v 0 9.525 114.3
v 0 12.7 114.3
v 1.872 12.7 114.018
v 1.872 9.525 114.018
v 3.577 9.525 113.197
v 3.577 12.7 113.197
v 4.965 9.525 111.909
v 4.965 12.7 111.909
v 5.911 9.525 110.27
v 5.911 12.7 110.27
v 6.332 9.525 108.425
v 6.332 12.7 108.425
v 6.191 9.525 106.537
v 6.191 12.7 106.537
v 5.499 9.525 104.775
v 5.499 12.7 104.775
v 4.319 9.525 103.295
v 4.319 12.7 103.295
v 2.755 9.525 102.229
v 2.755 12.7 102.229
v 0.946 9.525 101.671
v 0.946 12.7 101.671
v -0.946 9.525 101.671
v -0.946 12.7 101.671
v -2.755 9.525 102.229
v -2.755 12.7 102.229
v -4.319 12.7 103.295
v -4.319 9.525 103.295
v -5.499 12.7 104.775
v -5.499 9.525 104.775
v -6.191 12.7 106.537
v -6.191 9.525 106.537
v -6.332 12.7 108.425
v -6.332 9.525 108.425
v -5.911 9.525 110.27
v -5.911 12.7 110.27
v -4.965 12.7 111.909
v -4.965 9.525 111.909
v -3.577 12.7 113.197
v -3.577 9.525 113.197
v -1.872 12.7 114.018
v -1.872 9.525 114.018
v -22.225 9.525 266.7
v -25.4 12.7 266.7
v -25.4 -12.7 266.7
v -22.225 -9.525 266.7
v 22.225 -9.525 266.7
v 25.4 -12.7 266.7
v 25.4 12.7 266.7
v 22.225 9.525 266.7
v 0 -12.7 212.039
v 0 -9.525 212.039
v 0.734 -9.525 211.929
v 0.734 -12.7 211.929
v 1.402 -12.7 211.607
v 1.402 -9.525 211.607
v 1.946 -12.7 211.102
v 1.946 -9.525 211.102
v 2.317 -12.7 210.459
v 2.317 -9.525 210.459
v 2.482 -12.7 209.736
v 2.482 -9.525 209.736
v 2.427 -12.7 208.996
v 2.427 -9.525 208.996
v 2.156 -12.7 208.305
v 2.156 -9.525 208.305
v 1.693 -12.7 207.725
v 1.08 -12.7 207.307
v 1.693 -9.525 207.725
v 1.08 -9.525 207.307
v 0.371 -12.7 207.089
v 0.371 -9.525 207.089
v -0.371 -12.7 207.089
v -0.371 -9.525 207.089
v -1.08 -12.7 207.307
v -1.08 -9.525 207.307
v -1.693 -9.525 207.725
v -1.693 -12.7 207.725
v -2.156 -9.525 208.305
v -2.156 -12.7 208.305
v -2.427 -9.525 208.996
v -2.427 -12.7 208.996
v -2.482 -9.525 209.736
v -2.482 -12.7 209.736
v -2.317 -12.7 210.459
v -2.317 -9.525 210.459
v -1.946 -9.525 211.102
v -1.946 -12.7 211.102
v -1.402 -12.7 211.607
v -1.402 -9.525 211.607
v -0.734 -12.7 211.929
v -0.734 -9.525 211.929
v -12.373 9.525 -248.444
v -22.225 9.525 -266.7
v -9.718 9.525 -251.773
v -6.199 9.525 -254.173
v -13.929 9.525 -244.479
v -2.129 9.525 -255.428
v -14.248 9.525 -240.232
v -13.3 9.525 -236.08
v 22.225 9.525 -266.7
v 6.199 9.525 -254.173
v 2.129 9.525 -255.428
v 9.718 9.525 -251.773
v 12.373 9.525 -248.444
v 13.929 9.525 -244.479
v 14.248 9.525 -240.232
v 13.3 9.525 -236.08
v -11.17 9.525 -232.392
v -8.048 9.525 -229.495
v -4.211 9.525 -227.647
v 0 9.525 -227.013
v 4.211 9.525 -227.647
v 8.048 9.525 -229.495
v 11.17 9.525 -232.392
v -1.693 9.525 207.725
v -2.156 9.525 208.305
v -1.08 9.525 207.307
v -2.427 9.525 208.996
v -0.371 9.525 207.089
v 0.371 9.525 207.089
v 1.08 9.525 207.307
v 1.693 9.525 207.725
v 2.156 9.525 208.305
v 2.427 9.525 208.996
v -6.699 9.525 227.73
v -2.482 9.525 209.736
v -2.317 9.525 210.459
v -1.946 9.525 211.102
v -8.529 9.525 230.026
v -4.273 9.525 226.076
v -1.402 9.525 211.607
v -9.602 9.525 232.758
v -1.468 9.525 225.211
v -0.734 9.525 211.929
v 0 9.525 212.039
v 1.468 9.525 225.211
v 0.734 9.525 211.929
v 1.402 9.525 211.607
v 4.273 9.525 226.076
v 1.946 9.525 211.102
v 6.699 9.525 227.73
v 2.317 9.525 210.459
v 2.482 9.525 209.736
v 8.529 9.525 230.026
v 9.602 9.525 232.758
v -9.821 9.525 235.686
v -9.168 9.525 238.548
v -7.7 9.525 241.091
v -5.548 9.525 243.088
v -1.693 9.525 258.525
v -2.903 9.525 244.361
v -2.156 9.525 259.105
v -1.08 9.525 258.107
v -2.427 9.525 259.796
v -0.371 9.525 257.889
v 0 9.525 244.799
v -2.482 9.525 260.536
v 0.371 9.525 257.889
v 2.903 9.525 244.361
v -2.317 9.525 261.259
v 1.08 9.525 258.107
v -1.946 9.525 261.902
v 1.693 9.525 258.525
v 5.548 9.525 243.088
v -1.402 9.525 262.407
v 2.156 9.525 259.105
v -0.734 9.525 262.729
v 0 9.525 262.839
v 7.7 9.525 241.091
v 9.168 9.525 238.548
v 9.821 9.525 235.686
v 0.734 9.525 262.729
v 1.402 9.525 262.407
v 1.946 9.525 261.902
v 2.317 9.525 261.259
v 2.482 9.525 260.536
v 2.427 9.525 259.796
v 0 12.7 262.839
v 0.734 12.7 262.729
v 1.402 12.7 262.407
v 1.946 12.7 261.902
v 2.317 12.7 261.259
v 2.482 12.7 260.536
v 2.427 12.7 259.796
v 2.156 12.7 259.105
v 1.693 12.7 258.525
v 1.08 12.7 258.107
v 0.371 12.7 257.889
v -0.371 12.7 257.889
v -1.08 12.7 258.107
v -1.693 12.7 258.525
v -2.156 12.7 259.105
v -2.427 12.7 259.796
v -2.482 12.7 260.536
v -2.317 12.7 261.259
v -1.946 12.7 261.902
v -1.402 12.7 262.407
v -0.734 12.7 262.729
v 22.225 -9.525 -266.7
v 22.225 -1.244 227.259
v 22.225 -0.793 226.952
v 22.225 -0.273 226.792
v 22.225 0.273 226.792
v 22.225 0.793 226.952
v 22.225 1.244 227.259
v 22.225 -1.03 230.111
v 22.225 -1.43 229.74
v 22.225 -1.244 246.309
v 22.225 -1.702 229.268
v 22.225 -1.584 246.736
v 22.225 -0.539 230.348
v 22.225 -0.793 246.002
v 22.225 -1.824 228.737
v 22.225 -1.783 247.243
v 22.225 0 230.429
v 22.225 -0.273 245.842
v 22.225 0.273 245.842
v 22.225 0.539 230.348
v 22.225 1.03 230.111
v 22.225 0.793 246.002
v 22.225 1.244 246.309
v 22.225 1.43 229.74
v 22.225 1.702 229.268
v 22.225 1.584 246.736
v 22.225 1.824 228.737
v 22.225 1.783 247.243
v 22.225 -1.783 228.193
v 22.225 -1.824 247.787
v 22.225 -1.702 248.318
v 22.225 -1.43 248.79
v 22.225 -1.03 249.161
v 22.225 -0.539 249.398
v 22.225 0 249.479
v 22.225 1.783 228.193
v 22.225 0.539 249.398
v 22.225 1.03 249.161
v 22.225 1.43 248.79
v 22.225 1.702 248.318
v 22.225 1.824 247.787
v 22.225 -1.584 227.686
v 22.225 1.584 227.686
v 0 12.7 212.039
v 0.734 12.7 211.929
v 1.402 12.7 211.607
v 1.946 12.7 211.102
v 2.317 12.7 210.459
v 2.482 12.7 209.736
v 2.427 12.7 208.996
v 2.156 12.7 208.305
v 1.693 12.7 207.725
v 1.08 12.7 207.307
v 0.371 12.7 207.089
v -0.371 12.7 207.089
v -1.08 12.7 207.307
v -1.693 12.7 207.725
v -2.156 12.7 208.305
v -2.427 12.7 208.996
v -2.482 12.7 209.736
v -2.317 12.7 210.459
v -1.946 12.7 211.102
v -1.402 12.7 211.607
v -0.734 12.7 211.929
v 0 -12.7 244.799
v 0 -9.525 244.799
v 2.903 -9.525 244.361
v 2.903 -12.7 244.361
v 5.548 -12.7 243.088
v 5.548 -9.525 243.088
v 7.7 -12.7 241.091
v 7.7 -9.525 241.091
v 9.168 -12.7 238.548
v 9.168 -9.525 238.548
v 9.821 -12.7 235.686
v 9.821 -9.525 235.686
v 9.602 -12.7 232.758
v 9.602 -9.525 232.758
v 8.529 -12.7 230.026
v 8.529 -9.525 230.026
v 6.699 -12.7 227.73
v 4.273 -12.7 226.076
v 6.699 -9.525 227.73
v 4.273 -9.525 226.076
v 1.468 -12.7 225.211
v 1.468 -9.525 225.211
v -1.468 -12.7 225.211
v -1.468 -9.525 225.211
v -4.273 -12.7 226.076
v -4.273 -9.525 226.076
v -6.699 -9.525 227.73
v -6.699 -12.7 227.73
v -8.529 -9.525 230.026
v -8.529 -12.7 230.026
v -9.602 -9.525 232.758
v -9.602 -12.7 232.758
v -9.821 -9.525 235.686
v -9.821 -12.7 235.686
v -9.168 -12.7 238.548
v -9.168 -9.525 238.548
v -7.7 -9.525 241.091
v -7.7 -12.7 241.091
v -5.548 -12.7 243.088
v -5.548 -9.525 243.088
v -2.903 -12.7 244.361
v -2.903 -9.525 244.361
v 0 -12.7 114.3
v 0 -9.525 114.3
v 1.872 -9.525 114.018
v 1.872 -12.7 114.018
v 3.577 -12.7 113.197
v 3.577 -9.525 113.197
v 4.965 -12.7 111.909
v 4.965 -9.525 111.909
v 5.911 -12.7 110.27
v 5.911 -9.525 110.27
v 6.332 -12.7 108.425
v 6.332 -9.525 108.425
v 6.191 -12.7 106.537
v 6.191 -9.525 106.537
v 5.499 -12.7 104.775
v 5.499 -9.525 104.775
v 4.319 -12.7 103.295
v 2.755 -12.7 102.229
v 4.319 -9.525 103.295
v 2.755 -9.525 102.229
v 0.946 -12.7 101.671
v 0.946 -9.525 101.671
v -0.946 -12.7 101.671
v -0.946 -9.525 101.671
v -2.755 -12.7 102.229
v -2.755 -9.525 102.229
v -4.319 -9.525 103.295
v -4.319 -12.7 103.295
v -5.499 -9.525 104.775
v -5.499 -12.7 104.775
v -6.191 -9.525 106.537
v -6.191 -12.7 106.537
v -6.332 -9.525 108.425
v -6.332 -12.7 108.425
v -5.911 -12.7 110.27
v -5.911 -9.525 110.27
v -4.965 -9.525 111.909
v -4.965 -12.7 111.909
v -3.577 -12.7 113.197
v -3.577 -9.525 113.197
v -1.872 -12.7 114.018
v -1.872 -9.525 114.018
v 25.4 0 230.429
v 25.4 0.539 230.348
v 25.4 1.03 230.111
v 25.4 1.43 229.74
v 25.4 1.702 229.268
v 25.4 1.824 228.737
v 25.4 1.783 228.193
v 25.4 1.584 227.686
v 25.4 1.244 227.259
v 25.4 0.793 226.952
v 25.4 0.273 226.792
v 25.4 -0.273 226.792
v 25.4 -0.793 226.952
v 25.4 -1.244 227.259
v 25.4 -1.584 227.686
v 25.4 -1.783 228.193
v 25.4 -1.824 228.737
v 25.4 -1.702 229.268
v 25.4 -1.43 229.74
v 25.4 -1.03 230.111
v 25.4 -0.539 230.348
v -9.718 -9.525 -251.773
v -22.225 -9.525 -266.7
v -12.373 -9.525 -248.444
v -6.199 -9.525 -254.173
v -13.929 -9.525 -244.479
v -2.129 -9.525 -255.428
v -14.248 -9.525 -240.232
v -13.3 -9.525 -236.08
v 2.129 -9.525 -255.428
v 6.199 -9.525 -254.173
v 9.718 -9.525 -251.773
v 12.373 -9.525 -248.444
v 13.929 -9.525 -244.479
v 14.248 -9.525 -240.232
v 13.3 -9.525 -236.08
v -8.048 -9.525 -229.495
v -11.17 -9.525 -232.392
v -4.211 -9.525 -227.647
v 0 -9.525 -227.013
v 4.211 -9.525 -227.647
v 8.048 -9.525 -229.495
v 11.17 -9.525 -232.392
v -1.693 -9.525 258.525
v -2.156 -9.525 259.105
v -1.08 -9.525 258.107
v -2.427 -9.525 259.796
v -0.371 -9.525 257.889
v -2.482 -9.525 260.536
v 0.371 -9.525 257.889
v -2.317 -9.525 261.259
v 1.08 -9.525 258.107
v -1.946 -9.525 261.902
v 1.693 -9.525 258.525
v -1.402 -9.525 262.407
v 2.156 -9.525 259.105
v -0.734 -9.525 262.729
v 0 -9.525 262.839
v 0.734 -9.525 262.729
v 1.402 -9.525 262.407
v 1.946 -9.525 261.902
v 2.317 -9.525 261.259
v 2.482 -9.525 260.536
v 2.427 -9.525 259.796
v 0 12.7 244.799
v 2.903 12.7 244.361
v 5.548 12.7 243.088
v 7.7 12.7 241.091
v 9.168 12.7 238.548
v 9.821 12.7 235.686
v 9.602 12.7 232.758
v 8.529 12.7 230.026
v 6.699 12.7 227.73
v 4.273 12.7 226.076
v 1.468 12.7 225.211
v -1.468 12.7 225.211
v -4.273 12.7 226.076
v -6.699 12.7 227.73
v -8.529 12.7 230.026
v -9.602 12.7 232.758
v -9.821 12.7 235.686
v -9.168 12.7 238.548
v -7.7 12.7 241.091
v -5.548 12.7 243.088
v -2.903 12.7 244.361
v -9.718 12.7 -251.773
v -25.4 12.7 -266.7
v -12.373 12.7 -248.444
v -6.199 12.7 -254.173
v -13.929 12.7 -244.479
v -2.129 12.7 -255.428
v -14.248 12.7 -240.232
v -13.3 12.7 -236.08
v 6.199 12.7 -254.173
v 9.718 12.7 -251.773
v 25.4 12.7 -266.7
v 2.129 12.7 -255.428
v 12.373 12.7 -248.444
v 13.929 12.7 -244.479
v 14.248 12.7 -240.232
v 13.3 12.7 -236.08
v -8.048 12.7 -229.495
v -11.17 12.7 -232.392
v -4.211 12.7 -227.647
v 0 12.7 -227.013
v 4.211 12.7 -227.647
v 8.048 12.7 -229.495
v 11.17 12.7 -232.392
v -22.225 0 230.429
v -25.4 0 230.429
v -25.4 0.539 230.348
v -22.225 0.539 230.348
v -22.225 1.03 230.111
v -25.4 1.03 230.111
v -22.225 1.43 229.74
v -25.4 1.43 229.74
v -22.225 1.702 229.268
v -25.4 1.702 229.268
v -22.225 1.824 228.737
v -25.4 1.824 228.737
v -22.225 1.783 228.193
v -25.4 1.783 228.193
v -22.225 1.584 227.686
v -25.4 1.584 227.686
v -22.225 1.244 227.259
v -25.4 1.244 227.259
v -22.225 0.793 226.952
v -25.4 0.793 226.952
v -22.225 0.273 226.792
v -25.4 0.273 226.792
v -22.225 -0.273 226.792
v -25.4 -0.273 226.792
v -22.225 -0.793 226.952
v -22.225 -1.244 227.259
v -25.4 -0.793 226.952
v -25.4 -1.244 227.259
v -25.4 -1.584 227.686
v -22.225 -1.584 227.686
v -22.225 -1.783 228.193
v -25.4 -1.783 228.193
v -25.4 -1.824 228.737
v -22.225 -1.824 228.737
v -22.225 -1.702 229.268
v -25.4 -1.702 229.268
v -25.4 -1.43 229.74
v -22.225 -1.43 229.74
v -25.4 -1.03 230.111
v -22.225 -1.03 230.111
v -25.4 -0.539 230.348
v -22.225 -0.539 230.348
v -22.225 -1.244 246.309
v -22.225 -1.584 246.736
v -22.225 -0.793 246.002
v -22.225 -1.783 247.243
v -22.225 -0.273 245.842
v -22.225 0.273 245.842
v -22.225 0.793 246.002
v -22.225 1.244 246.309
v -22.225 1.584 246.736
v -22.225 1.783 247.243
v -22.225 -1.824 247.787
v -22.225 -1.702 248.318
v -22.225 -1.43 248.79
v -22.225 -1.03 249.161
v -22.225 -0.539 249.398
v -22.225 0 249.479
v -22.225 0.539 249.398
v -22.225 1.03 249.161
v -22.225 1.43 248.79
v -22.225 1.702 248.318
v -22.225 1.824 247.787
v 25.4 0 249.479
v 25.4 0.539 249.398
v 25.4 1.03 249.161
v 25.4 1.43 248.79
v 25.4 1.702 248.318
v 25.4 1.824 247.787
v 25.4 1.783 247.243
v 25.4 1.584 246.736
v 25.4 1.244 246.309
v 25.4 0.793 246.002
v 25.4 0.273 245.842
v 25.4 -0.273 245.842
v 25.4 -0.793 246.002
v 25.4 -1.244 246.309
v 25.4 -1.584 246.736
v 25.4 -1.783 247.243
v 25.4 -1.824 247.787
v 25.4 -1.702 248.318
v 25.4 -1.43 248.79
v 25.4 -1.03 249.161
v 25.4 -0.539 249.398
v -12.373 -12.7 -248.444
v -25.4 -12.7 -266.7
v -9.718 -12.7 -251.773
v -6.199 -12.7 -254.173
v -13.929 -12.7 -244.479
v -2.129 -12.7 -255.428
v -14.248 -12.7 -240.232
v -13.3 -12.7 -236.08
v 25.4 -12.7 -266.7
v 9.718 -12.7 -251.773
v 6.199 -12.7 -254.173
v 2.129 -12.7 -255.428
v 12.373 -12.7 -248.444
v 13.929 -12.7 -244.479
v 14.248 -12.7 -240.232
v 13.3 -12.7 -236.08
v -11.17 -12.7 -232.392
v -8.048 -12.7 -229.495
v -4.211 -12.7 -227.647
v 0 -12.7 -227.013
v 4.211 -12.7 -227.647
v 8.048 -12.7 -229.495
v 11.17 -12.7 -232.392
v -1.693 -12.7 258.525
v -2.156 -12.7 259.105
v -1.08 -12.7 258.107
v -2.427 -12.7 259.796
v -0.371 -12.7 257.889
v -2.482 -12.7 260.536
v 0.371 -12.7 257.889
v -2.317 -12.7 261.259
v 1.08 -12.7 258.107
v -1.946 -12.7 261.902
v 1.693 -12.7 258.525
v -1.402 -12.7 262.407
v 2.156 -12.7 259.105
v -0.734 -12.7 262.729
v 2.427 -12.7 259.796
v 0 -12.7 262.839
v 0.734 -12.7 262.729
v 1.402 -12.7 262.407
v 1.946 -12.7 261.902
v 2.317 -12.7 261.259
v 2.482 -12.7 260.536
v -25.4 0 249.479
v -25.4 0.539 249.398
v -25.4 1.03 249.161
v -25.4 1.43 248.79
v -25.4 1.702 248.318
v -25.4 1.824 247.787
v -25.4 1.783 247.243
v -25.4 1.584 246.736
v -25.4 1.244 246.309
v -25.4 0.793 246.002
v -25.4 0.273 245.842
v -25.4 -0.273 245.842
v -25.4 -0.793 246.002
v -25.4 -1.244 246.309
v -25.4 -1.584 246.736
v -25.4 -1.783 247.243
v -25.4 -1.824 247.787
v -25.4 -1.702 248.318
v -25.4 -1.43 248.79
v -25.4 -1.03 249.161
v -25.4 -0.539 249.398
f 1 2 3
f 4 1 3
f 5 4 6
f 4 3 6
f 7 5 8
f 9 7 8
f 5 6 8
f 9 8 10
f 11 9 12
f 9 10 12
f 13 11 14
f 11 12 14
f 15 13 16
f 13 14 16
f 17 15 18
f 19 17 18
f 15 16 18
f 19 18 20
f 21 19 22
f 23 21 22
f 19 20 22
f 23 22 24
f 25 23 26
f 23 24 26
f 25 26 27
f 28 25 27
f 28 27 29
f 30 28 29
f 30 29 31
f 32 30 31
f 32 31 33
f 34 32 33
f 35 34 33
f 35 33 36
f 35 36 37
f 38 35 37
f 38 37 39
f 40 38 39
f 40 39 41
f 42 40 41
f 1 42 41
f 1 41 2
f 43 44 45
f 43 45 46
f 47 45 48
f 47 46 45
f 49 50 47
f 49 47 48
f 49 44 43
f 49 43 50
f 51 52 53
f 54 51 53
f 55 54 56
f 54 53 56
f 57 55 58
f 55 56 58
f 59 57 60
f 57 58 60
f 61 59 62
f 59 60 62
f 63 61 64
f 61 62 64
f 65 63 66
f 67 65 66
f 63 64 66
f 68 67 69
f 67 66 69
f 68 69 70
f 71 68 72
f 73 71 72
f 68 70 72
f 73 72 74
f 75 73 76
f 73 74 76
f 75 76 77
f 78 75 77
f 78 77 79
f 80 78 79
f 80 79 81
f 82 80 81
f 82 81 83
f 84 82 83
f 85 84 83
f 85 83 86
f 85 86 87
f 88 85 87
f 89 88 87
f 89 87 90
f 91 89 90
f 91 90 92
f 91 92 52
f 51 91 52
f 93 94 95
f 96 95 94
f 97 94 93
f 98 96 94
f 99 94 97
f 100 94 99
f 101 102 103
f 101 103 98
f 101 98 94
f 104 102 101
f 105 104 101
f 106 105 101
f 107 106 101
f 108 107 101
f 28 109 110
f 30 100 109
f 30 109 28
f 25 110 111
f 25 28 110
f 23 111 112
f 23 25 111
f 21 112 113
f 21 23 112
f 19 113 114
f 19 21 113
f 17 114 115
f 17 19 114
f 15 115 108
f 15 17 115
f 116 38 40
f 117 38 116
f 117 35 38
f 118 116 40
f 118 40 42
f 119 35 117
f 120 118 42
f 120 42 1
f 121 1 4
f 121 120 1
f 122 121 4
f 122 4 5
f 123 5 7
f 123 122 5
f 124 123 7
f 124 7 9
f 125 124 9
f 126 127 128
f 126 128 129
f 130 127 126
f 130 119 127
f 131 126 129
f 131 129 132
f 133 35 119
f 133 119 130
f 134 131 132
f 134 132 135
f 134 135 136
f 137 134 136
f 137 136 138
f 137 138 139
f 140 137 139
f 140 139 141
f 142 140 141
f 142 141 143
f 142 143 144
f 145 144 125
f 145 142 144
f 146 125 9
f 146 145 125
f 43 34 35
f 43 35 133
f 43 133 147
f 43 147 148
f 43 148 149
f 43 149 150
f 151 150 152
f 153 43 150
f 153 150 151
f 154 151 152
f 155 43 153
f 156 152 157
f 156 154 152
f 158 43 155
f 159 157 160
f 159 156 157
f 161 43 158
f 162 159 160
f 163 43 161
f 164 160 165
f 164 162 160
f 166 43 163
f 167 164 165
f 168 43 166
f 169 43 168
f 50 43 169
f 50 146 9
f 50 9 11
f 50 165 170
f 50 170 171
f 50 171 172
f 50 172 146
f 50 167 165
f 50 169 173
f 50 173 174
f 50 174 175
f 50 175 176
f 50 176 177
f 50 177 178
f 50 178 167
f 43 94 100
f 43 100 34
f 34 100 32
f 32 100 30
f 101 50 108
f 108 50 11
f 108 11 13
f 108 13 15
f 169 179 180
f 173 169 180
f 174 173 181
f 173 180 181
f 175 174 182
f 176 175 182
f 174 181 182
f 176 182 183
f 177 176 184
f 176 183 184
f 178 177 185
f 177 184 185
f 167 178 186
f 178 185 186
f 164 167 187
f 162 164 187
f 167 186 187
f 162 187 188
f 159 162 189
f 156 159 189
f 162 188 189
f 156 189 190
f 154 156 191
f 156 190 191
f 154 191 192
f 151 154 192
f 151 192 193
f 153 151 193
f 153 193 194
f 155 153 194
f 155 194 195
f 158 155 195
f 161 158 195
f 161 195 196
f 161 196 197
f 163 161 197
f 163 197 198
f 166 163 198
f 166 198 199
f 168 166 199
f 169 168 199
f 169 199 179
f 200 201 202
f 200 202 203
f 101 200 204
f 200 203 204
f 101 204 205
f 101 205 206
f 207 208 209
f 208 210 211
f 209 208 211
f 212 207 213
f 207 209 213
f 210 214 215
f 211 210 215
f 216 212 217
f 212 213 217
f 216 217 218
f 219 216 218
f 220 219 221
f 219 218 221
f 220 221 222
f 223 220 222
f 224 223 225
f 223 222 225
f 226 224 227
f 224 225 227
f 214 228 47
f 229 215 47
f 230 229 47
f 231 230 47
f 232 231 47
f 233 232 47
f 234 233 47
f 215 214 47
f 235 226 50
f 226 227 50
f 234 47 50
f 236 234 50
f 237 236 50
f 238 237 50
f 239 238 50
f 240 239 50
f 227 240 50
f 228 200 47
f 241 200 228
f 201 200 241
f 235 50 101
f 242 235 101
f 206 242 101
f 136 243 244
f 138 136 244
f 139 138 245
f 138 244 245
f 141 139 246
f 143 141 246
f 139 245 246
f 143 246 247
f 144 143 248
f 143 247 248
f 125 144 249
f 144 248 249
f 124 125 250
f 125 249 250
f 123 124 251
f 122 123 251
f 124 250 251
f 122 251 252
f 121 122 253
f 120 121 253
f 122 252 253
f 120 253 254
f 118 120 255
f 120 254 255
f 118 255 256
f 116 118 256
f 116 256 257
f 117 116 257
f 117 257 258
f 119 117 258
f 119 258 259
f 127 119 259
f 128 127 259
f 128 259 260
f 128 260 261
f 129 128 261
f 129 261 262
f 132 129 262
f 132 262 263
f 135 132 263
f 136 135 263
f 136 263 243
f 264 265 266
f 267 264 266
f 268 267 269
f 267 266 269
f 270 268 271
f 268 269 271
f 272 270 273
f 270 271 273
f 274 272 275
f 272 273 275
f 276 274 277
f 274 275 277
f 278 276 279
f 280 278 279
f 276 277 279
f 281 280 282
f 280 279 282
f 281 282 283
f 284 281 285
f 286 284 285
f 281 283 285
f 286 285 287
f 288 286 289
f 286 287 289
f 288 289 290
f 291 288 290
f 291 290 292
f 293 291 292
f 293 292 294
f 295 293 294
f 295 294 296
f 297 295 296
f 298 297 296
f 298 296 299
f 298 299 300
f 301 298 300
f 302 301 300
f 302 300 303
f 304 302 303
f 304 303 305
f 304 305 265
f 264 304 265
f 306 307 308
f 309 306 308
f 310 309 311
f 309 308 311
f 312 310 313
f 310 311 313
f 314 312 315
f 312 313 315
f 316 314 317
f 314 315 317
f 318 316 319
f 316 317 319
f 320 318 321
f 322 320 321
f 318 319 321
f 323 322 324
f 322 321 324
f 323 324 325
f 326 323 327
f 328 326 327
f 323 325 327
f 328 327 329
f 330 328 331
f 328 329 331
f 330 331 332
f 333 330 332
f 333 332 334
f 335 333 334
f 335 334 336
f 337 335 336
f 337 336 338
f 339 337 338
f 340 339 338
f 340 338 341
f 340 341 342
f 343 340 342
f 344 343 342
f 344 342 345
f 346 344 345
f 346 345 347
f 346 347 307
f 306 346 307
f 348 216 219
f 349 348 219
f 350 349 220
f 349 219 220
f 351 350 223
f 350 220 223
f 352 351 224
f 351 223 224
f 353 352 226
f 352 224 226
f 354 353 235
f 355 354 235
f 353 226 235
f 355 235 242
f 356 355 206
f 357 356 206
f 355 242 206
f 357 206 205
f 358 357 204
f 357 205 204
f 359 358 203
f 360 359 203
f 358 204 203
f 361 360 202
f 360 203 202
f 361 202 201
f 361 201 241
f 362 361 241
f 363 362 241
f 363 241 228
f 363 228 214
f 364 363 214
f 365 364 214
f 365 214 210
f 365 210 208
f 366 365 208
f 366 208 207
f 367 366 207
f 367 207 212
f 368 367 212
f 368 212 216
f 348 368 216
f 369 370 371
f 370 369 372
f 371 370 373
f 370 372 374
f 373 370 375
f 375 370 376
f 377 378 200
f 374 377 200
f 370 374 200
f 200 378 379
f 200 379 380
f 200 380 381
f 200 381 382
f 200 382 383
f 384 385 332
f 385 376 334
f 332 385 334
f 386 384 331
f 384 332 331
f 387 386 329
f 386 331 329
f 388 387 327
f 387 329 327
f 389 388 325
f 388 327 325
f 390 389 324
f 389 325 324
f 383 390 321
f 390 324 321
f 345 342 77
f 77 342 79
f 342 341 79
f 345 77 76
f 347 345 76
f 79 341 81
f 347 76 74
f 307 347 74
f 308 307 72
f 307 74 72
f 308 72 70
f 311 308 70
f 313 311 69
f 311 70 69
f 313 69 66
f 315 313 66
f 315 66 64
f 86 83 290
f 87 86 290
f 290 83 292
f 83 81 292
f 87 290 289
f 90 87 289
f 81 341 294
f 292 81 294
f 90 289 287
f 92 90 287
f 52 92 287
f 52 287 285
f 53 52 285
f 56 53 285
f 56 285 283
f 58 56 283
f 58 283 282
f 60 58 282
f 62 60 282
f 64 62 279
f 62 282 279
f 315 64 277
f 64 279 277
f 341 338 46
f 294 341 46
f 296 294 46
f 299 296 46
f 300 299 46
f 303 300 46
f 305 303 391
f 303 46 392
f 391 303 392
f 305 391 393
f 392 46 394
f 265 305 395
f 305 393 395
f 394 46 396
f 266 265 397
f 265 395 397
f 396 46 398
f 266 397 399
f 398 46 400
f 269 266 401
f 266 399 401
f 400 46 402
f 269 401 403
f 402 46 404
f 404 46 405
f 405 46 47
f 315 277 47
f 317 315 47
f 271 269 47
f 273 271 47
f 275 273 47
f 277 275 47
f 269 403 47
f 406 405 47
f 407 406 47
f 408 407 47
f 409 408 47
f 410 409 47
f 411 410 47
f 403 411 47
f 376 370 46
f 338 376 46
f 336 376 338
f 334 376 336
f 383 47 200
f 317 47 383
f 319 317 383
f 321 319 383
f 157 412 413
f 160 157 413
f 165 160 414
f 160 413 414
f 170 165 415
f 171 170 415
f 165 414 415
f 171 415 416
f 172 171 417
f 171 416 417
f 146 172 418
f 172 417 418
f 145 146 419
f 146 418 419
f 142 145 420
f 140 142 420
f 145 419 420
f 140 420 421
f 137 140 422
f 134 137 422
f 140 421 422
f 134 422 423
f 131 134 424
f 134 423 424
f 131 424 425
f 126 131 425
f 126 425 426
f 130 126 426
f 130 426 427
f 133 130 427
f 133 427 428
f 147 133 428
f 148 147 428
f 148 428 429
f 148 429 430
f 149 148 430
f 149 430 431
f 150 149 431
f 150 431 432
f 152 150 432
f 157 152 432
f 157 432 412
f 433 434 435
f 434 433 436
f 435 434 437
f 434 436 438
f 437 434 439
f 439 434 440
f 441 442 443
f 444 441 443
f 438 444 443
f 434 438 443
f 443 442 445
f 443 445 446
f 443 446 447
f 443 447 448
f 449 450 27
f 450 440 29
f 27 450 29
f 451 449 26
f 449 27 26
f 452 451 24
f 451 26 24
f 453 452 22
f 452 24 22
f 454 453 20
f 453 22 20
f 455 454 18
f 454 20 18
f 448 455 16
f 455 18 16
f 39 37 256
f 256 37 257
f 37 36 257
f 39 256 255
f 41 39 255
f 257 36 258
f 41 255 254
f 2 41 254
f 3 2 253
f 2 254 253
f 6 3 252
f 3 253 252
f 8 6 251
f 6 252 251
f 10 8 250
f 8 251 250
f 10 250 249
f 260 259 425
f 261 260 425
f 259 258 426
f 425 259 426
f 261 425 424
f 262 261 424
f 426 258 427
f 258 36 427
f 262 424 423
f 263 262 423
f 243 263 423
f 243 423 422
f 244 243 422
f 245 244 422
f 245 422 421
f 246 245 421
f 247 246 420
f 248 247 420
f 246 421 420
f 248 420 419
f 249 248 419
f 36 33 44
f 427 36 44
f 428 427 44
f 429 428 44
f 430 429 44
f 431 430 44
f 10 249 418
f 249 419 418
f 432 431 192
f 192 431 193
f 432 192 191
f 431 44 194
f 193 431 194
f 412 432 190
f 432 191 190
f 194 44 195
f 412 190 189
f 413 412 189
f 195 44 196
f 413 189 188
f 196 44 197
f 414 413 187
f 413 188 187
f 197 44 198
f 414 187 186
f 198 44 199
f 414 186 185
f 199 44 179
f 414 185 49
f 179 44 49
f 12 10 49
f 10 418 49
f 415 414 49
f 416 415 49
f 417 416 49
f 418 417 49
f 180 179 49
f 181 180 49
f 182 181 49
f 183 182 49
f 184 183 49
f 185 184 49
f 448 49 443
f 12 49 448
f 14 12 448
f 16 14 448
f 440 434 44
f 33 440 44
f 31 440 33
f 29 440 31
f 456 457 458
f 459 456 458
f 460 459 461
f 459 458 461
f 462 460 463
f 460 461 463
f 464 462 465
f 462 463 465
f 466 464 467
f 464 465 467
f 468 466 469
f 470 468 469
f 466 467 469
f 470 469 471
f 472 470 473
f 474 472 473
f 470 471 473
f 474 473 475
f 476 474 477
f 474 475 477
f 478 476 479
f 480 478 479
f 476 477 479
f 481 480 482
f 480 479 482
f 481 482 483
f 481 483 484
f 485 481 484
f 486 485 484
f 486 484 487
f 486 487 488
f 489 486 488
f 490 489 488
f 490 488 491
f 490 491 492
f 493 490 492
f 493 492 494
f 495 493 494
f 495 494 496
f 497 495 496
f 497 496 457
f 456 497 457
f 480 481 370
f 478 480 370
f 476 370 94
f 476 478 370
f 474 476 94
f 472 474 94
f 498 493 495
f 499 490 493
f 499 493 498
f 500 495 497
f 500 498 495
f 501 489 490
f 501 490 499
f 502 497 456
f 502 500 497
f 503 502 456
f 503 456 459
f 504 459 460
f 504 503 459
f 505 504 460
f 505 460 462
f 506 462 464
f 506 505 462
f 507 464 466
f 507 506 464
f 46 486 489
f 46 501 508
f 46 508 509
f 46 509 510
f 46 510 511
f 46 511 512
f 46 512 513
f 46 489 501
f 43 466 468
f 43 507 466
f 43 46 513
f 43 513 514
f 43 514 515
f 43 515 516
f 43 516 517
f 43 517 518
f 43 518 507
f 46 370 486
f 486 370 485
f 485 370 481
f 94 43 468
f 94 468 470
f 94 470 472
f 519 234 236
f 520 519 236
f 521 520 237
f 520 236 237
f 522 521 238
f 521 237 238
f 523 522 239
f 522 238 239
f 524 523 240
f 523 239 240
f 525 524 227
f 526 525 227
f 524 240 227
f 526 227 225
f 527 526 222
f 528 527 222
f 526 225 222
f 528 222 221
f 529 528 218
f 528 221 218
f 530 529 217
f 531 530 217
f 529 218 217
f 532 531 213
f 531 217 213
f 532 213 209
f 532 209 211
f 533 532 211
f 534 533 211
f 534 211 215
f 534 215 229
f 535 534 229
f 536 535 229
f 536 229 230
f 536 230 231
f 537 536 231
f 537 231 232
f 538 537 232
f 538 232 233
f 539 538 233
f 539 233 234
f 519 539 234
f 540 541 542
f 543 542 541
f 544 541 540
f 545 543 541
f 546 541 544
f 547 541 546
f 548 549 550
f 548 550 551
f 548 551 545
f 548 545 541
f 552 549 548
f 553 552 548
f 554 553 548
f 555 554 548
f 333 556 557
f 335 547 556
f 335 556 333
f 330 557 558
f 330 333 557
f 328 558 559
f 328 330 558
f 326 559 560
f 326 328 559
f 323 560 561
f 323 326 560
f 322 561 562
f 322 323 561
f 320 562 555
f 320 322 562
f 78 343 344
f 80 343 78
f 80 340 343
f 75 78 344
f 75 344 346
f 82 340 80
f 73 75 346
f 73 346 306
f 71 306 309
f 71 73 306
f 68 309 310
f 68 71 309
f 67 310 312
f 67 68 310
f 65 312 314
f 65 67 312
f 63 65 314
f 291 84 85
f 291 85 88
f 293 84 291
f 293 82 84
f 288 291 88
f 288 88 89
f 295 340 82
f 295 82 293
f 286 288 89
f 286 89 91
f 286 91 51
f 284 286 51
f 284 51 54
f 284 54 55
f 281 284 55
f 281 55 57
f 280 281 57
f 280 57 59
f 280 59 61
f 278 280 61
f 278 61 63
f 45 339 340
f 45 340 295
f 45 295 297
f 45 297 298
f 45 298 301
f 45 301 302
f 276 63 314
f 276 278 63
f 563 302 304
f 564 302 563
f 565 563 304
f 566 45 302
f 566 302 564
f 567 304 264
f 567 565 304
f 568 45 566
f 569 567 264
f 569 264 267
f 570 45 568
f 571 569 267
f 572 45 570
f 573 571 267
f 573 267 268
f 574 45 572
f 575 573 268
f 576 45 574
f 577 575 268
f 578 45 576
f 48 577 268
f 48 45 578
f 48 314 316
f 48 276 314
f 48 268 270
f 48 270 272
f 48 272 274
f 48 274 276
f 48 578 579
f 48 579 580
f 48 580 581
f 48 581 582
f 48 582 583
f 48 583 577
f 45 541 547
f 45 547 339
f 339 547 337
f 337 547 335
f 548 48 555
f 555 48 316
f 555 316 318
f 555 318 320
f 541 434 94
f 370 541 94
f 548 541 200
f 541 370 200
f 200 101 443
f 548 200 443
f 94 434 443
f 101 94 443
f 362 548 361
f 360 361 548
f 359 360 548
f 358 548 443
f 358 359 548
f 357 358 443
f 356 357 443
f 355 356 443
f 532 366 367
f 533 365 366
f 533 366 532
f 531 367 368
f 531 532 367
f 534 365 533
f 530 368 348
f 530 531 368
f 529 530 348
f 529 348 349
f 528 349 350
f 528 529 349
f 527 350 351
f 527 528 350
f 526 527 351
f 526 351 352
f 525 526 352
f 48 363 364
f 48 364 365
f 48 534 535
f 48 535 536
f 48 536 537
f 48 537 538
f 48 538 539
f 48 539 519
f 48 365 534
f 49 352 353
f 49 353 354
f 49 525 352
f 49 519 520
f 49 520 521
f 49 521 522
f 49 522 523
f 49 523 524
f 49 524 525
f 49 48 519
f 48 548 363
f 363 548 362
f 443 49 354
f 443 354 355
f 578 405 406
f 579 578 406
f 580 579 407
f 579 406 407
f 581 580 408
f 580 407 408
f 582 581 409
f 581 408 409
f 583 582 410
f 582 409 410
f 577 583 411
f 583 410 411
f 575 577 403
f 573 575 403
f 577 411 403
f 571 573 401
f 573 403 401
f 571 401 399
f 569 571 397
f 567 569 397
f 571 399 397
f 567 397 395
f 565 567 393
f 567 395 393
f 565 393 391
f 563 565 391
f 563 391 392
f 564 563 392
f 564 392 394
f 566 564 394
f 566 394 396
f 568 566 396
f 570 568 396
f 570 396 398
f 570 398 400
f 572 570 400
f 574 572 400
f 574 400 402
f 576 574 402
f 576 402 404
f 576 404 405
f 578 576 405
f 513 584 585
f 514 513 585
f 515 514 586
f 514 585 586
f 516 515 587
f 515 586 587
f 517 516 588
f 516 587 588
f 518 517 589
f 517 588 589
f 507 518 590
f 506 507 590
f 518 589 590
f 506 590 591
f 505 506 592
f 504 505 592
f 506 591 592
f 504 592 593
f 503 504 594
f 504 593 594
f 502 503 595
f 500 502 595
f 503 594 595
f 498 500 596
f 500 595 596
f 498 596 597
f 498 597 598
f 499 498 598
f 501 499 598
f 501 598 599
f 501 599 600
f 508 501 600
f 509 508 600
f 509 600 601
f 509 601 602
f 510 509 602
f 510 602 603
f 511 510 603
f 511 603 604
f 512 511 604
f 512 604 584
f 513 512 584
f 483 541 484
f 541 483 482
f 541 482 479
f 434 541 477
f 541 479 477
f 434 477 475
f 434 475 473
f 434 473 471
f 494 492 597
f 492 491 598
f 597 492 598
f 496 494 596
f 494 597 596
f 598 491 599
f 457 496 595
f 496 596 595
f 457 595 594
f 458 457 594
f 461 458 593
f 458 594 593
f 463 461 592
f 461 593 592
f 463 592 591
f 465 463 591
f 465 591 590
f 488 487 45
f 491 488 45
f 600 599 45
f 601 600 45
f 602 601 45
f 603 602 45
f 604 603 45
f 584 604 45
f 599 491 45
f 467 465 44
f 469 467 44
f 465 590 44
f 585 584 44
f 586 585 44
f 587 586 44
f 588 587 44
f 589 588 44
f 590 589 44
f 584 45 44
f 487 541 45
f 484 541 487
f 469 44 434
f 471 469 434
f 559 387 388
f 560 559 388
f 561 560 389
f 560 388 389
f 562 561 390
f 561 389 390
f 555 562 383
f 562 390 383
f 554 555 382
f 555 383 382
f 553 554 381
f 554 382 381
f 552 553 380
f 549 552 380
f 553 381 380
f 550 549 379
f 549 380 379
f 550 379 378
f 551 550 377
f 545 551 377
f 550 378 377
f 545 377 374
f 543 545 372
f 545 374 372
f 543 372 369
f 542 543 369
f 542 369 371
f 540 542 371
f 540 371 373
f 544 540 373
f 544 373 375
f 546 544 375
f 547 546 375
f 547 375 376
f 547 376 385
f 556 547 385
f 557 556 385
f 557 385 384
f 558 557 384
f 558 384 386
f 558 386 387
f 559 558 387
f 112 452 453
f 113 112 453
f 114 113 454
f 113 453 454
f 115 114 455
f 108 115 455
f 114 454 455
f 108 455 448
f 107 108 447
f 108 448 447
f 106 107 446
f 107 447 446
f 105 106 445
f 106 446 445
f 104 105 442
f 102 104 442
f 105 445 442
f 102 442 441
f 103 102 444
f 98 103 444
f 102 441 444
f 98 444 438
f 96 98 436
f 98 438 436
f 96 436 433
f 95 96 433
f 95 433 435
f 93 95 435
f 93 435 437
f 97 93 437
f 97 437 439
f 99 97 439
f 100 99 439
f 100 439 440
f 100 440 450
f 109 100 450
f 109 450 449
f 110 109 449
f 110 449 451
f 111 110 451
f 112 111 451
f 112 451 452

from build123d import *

# Parameters (mm, degrees)
SKETCH1_W                   = 50.8
SKETCH1_H                   = 25.4
BOSS_EXTRUDE1_DEPTH         = 266.7
SKETCH2_W                   = 44.45
SKETCH2_H                   = 19.05
CUT_EXTRUDE1_DEPTH          = 535.155417458
SKETCH5_R                   = 2.4892
SKETCH5_R_2                 = 9.84885
SKETCH5_R_3                 = 14.2875
CUT_EXTRUDE2_DEPTH          = 508
SKETCH7_R                   = 6.35
CUT_EXTRUDE4_DEPTH          = 270.108175275
F_27_0_144_DIAMETER_HOLE1_D = 3.6576


with BuildPart() as part:
    # Sketch1 → Boss-Extrude1 (new, symmetric)
    with BuildSketch(Plane.XY):
        Rectangle(SKETCH1_W, SKETCH1_H)
    extrude(amount=BOSS_EXTRUDE1_DEPTH, both=True)

    # Sketch2 → Cut-Extrude1 (cut, through all)
    with BuildSketch(Plane.XY.offset(266.7)):
        Rectangle(SKETCH2_W, SKETCH2_H)
    extrude(amount=-CUT_EXTRUDE1_DEPTH, mode=Mode.SUBTRACT)

    # Sketch5 → Cut-Extrude2 (cut)
    with BuildSketch(Plane(origin=(0, 12.7, 0), x_dir=(1, 0, 0), z_dir=(0, 1, 0))):
        with Locations(Location((0, -260.35, 0), (0, 0, 270))):
            Circle(SKETCH5_R)
        with Locations(Location((0, -234.95, 0), (0, 0, 270))):
            Circle(SKETCH5_R_2)
        with Locations(Location((0, -209.55, 0), (0, 0, 270))):
            Circle(SKETCH5_R)
        with Locations(Location((0, 241.3, 0), (0, 0, 270))):
            Circle(SKETCH5_R_3)
    extrude(amount=-CUT_EXTRUDE2_DEPTH, mode=Mode.SUBTRACT)

    # Sketch7 → Cut-Extrude4 (cut, through all)
    with BuildSketch(Plane(origin=(0, 12.7, 0), x_dir=(1, 0, 0), z_dir=(0, 1, 0))):
        with Locations(Location((0, -107.95, 0), (0, 0, 270))):
            Circle(SKETCH7_R)
    extrude(amount=-CUT_EXTRUDE4_DEPTH, mode=Mode.SUBTRACT)

    # #27 (0.144) Diameter Hole1 (through all)
    with Locations(Plane(origin=(25.4, 0, 0), x_dir=(0, 0, -1), z_dir=(1, 0, 0))):
        with Locations((-247.65, 0), (-228.6, 0)):
            Hole(F_27_0_144_DIAMETER_HOLE1_D / 2)


solid = part.part
